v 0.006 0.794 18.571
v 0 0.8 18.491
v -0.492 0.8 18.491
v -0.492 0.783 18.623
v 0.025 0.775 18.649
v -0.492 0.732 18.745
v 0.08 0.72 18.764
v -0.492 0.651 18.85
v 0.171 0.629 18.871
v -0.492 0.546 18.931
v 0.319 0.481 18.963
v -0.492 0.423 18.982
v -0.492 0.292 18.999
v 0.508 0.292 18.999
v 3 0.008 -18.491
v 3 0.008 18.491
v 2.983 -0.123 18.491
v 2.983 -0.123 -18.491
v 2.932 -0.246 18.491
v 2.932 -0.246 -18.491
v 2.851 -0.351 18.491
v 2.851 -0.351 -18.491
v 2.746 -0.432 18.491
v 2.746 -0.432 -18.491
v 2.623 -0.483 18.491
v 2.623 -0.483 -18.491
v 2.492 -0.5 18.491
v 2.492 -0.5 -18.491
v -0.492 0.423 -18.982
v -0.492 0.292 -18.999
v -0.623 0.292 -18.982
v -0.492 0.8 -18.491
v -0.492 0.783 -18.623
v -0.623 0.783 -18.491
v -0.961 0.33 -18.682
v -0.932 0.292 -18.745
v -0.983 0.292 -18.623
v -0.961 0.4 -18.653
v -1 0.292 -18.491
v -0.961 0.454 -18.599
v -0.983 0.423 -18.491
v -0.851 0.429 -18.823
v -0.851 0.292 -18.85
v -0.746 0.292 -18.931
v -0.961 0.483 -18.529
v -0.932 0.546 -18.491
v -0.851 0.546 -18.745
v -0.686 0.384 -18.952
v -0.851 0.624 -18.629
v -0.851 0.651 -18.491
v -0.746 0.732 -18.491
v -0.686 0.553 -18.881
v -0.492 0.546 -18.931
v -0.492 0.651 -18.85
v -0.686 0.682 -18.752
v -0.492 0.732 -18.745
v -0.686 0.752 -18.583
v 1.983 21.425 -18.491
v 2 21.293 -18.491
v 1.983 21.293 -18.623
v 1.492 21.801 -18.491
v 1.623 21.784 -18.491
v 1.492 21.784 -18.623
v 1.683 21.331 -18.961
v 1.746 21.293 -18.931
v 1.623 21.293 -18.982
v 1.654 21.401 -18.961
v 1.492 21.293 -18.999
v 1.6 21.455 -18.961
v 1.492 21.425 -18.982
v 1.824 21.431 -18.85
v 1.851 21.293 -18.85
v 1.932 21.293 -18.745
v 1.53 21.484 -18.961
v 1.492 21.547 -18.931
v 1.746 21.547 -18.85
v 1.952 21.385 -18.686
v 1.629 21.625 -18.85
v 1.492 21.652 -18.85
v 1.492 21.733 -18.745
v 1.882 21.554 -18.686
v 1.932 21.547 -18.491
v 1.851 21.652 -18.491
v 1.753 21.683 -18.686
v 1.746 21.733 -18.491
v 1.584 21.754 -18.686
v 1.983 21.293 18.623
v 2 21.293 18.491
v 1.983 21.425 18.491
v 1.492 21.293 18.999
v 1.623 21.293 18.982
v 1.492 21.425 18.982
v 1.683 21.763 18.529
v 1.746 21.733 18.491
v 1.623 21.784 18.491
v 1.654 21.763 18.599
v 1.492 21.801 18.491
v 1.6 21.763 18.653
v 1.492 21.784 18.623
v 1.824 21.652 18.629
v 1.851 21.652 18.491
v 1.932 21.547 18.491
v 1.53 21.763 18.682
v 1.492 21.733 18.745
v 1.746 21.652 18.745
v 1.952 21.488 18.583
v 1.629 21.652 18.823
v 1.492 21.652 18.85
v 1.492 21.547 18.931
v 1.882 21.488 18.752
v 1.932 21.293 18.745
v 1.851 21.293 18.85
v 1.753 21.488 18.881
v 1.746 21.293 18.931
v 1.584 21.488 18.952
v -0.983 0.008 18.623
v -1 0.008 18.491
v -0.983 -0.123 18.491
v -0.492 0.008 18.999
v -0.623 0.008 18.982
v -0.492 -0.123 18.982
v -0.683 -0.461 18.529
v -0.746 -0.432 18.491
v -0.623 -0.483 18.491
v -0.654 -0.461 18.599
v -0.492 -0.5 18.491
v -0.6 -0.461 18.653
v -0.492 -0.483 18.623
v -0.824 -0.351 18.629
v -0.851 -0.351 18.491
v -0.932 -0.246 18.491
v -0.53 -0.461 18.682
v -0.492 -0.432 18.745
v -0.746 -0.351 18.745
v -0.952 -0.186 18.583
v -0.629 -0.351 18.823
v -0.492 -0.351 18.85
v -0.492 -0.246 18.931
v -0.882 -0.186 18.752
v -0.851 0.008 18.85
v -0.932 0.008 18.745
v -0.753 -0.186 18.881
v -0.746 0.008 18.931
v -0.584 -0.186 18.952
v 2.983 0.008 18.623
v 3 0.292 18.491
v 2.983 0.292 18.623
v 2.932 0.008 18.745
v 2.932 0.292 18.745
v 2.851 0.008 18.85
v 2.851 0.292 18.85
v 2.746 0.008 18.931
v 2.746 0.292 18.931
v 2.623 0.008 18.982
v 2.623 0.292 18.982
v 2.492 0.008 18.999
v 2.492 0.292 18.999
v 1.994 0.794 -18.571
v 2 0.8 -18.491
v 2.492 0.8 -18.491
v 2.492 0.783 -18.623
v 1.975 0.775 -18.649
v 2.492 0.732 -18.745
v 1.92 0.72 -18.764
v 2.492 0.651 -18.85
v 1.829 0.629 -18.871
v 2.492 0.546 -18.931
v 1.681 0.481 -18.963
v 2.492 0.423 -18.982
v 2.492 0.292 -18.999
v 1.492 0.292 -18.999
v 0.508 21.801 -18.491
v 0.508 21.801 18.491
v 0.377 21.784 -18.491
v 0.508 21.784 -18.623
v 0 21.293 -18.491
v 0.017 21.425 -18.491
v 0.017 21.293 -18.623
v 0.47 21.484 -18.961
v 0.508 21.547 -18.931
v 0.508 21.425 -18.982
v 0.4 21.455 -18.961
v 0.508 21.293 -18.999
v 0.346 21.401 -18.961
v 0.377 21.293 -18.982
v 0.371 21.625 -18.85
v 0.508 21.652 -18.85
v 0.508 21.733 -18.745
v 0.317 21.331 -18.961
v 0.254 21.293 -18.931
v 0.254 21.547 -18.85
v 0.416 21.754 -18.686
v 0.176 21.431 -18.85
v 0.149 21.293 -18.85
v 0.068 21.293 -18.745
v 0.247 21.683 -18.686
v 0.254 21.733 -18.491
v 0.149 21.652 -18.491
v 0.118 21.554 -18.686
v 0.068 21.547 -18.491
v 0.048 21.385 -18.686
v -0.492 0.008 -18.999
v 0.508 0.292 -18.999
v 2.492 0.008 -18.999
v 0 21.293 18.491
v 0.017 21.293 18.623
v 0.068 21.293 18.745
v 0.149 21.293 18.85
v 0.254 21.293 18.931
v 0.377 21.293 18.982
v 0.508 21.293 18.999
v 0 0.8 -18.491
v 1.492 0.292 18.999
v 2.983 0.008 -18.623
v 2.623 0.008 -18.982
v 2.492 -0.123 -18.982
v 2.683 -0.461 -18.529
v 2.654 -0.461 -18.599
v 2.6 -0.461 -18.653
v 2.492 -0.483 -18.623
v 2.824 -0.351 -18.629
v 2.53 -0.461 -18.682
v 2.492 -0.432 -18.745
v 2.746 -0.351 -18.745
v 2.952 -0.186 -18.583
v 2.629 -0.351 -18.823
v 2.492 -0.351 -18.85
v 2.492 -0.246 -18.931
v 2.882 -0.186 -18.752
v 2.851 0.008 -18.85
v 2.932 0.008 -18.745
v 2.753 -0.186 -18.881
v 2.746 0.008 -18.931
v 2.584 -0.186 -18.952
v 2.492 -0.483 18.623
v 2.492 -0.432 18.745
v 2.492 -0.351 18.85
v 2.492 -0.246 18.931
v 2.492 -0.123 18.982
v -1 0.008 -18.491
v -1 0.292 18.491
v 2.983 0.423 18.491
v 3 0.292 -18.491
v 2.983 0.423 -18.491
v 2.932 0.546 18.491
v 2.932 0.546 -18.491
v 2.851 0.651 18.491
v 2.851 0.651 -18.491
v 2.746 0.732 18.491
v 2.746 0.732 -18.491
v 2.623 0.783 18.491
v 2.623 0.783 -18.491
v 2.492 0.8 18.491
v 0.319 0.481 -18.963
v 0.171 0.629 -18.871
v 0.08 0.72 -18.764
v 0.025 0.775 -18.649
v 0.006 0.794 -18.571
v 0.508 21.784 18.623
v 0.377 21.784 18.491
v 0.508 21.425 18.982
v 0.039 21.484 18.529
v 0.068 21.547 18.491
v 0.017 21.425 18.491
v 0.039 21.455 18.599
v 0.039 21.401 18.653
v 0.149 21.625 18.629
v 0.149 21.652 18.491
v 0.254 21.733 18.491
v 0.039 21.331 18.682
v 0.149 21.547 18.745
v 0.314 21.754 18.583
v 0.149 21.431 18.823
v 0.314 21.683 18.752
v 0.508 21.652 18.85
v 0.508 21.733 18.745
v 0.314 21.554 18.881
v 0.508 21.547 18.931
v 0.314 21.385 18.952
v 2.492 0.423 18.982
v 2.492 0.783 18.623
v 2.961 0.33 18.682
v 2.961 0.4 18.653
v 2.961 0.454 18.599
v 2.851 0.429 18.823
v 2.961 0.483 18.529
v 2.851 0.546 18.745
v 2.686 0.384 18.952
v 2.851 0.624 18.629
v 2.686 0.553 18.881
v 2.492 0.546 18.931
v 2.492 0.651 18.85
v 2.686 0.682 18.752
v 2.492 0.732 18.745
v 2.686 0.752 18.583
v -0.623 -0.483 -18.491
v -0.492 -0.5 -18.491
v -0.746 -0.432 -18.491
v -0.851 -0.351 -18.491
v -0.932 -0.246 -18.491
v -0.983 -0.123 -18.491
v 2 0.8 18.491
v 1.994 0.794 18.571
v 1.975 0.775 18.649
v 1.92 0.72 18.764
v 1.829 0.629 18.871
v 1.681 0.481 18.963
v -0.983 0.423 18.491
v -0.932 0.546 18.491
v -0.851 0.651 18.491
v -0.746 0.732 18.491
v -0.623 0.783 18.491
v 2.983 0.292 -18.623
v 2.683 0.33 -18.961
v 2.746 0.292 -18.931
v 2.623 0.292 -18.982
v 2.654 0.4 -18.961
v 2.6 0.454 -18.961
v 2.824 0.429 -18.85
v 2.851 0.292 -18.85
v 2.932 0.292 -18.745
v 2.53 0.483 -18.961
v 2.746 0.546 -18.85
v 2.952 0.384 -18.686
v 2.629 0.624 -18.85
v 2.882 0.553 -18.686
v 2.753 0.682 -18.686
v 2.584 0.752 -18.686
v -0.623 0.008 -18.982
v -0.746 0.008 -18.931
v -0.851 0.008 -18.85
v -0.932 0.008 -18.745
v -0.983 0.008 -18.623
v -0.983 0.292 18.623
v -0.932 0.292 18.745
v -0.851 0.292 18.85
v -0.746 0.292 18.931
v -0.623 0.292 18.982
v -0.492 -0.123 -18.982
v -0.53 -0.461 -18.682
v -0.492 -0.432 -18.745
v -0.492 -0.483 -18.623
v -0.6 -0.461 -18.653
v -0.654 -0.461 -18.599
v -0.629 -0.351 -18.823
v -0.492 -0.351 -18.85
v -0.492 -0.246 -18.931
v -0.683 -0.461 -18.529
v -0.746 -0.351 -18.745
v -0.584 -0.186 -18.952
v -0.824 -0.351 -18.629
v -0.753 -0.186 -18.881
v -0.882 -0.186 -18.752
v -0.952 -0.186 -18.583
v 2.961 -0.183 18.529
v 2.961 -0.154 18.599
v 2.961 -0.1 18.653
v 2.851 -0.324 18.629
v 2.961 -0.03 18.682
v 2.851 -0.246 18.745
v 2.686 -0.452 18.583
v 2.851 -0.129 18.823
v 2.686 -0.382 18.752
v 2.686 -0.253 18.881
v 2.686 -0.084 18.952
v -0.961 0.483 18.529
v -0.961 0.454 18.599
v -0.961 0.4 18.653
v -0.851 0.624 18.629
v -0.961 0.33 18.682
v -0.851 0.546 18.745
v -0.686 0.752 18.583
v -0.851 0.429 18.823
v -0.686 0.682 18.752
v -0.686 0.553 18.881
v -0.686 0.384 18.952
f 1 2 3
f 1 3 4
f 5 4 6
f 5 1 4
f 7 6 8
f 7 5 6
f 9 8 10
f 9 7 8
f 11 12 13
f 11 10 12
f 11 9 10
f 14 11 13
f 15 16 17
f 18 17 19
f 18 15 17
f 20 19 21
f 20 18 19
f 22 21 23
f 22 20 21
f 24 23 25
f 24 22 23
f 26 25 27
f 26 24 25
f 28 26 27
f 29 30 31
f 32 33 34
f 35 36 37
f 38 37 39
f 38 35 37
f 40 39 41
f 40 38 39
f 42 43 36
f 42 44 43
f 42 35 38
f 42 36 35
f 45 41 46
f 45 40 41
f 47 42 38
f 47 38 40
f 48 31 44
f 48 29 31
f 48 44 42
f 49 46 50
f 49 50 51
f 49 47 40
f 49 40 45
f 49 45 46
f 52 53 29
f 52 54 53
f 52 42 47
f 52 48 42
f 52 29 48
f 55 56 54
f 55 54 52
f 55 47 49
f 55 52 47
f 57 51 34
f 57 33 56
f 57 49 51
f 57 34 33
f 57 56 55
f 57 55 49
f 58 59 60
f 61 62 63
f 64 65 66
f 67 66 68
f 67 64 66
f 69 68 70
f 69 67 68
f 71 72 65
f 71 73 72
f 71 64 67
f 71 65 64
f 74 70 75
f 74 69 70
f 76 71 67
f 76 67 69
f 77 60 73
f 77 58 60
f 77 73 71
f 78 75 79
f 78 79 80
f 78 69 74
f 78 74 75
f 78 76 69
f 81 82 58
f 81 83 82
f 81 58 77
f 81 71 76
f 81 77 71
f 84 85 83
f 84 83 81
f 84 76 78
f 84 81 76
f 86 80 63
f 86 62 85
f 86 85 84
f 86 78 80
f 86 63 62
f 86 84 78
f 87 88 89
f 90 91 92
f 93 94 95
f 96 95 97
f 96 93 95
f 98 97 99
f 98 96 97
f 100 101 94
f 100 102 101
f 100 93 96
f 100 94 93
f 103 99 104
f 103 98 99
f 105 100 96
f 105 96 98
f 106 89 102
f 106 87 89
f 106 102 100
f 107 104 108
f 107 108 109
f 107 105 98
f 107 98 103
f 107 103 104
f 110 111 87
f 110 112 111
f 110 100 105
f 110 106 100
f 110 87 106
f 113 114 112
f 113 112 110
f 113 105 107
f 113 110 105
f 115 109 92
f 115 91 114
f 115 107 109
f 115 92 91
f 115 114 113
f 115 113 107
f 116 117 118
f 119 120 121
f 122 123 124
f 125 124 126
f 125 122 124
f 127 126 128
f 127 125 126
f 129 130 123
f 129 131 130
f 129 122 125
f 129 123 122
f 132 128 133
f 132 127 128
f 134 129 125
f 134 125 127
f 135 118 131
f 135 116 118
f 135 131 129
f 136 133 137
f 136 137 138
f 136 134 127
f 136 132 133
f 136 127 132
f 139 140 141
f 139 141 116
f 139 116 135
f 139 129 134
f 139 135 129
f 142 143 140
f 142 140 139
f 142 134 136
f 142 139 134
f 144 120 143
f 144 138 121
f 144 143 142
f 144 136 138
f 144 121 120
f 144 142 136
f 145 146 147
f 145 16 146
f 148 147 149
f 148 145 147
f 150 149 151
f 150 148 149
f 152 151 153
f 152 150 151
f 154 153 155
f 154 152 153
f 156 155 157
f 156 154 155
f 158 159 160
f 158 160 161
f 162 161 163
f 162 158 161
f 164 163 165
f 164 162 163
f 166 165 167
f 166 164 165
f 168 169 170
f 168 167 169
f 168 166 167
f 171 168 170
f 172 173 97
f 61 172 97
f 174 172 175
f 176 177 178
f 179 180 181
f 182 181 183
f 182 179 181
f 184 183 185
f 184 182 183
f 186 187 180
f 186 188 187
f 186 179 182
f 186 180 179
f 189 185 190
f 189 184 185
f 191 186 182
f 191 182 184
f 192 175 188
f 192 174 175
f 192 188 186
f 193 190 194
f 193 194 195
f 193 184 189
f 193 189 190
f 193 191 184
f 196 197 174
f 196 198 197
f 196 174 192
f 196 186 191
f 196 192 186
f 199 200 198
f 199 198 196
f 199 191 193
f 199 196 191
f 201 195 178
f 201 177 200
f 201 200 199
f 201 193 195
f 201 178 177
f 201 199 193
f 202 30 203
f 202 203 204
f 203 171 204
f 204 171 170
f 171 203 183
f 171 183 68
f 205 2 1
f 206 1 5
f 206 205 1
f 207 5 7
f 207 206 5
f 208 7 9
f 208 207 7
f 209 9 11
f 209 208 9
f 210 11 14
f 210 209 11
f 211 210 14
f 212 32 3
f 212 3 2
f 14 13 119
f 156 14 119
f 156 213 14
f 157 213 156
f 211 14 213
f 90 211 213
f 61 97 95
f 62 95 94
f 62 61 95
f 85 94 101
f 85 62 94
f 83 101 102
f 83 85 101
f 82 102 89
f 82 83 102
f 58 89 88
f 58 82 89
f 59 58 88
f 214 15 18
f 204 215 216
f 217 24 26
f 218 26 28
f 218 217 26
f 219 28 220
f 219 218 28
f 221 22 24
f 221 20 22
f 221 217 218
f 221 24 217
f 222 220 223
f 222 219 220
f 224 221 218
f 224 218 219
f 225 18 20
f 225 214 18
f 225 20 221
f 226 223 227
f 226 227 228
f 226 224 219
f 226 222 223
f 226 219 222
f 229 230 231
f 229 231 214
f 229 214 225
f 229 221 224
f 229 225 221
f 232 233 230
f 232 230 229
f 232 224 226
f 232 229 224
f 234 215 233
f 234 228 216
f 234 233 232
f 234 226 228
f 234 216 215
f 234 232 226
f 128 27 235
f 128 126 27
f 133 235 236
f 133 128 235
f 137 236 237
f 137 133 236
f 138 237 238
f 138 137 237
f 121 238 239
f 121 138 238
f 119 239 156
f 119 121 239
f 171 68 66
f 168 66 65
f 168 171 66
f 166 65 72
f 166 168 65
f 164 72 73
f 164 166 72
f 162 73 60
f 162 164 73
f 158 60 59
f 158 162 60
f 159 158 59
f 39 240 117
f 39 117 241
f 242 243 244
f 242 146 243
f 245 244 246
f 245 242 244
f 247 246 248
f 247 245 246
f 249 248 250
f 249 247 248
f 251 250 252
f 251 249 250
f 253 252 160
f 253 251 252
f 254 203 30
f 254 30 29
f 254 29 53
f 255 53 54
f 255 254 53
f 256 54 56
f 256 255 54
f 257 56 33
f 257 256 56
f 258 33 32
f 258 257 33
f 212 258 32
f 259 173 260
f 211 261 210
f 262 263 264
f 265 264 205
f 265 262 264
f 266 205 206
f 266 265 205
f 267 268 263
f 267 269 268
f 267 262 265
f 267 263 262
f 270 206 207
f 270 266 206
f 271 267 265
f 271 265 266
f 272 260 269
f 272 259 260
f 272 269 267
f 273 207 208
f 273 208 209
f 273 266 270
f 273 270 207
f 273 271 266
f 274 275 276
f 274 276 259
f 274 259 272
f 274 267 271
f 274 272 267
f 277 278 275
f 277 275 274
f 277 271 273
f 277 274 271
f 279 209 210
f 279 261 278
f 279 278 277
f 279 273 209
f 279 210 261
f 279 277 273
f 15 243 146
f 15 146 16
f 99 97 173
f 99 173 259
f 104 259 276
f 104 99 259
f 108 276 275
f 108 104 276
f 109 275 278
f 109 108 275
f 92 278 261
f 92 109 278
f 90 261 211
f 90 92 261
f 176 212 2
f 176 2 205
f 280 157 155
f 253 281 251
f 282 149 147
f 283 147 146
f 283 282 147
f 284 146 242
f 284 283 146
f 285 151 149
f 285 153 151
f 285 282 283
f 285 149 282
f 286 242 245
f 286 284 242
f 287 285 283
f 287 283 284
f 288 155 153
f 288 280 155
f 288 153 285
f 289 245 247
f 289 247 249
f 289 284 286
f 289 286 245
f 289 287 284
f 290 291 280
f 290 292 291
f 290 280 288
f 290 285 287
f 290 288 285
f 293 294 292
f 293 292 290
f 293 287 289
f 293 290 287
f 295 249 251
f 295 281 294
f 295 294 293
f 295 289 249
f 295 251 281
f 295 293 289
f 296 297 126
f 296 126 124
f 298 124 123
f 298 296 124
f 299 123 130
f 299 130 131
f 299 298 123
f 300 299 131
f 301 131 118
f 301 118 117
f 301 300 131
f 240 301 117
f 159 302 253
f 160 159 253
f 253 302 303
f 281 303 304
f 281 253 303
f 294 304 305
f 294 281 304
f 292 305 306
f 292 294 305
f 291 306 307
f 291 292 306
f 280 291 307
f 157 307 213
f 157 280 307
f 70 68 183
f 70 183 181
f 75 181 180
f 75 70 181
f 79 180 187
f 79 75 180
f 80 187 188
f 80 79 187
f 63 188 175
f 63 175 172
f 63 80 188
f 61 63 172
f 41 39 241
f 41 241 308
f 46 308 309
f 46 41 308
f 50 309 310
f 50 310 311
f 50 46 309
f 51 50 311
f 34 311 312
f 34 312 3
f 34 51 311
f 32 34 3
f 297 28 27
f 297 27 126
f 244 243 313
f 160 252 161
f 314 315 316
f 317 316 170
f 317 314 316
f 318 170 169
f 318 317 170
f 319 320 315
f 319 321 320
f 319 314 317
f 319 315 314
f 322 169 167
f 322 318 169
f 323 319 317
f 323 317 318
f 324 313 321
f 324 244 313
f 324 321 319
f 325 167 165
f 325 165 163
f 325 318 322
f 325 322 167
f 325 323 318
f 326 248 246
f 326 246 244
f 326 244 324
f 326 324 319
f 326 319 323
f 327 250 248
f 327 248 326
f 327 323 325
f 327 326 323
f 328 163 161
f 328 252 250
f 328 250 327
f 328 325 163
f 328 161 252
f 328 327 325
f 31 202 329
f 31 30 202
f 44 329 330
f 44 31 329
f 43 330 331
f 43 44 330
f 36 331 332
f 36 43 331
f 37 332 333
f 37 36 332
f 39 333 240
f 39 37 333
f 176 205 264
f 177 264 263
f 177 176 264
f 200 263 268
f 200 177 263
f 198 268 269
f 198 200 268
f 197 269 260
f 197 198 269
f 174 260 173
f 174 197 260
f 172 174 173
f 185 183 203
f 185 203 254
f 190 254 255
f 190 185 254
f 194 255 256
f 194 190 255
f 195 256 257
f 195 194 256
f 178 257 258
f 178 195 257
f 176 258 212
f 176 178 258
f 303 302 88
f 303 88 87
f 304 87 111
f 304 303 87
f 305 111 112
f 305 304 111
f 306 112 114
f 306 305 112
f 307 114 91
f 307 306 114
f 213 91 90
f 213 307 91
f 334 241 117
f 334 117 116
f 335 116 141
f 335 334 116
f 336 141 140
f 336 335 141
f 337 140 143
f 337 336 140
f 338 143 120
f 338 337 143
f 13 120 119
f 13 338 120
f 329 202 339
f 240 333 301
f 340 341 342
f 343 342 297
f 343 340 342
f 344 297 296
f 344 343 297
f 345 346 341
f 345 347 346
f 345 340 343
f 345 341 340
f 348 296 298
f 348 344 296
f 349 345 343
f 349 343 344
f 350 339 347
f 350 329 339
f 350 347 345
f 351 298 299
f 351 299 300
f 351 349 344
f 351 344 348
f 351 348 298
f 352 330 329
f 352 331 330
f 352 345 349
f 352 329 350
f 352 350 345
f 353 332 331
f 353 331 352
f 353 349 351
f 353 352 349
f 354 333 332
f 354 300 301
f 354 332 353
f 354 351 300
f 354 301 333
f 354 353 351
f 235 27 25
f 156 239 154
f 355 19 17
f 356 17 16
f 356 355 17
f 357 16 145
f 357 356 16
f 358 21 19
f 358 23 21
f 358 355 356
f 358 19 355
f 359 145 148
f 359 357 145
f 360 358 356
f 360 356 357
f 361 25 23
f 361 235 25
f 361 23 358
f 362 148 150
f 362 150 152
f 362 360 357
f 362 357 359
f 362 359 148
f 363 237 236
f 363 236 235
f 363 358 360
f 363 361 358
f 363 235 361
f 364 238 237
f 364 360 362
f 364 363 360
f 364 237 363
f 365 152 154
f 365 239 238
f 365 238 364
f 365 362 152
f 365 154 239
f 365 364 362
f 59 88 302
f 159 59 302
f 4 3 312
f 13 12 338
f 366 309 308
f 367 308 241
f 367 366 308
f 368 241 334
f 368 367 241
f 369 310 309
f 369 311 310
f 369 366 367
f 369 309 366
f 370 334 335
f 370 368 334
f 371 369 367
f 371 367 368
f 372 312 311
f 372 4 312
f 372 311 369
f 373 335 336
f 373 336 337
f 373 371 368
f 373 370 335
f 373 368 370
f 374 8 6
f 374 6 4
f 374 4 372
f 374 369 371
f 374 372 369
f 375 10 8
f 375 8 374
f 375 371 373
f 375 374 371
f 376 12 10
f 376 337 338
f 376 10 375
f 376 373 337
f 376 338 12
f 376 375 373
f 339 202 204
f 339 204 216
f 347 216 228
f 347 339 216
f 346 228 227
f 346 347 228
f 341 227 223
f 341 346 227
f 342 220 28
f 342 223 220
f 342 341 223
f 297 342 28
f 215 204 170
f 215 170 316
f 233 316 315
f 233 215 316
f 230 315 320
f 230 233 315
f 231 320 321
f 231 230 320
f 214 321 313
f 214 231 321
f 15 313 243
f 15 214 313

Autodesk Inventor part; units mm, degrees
ref_plane "YZ Plane" through (0, 0, 0) normal (1, 0, 0) x (0, 1, 0)
ref_plane "XZ Plane" through (0, 0, 0) normal (0, 1, 0) x (-1, 0, 0)
ref_plane "XY Plane" through (0, 0, 0) normal (0, 0, 1) x (1, 0, 0)
sketch "Sketch1" plane through (0, 0, 0) normal (0, 0, 1) x (1, 0, 0)
  line L0 (3, 0.8) -> (3, -0.5)
  line L1 (3, -0.5) -> (-1, -0.5)
  line L2 (-1, -0.5) -> (-1, 0.8)
  line L3 (0, 0.8) -> (0, 21.8012)
  line L4 (0, 21.8012) -> (2, 21.8012)
  line L5 (2, 21.8012) -> (2, 0.8)
  line L6 (-1, 0.8) -> (0, 0.8)
  line L7 (2, 0.8) -> (3, 0.8)
  line L8 (-1, 0.8) -> (0, 0.8)
  line L9 (2, 0.8) -> (2.5, 0.8)
  point P0 (0, 0)
  point P1 (1, -0.5)
  point P2 (1, -0.5)
  dimension "d0" = 22.3012
  dimension "d1" = 4
  dimension "d2" = 1.3
  dimension "d3" = 1
  dimension "d4" = 1
extrude "Extrusion1" add sketch "Sketch1" along normal mid plane 37.9984
fillet "Fillet1" radius 0.508 22 edges at (2, 11.3006, 18.9992) (2, 21.8012, 0) (2, 11.3006, -18.9992) (2.5, 0.8, 18.9992) (-0.5, 0.8, 18.9992) (-1, 0.15, 18.9992) (1, -0.5, 18.9992) (3, 0.15, 18.9992) (3, 0.8, 0) (1, 21.8012, 18.9992) (0, 11.3006, 18.9992) (0, 21.8012, 0) (2.5, 0.8, -18.9992) (3, 0.15, -18.9992) (-0.5, 0.8, -18.9992) (-1, 0.15, -18.9992) (1, -0.5, -18.9992) (-1, 0.8, 0) (-1, -0.5, 0) (1, 21.8012, -18.9992) (3, -0.5, 0) (0, 11.3006, -18.9992)
equation "\"d4\" = d3"
properties part number "Medium Conveyor Belt Inserts" material "Acetal Resin, White"
